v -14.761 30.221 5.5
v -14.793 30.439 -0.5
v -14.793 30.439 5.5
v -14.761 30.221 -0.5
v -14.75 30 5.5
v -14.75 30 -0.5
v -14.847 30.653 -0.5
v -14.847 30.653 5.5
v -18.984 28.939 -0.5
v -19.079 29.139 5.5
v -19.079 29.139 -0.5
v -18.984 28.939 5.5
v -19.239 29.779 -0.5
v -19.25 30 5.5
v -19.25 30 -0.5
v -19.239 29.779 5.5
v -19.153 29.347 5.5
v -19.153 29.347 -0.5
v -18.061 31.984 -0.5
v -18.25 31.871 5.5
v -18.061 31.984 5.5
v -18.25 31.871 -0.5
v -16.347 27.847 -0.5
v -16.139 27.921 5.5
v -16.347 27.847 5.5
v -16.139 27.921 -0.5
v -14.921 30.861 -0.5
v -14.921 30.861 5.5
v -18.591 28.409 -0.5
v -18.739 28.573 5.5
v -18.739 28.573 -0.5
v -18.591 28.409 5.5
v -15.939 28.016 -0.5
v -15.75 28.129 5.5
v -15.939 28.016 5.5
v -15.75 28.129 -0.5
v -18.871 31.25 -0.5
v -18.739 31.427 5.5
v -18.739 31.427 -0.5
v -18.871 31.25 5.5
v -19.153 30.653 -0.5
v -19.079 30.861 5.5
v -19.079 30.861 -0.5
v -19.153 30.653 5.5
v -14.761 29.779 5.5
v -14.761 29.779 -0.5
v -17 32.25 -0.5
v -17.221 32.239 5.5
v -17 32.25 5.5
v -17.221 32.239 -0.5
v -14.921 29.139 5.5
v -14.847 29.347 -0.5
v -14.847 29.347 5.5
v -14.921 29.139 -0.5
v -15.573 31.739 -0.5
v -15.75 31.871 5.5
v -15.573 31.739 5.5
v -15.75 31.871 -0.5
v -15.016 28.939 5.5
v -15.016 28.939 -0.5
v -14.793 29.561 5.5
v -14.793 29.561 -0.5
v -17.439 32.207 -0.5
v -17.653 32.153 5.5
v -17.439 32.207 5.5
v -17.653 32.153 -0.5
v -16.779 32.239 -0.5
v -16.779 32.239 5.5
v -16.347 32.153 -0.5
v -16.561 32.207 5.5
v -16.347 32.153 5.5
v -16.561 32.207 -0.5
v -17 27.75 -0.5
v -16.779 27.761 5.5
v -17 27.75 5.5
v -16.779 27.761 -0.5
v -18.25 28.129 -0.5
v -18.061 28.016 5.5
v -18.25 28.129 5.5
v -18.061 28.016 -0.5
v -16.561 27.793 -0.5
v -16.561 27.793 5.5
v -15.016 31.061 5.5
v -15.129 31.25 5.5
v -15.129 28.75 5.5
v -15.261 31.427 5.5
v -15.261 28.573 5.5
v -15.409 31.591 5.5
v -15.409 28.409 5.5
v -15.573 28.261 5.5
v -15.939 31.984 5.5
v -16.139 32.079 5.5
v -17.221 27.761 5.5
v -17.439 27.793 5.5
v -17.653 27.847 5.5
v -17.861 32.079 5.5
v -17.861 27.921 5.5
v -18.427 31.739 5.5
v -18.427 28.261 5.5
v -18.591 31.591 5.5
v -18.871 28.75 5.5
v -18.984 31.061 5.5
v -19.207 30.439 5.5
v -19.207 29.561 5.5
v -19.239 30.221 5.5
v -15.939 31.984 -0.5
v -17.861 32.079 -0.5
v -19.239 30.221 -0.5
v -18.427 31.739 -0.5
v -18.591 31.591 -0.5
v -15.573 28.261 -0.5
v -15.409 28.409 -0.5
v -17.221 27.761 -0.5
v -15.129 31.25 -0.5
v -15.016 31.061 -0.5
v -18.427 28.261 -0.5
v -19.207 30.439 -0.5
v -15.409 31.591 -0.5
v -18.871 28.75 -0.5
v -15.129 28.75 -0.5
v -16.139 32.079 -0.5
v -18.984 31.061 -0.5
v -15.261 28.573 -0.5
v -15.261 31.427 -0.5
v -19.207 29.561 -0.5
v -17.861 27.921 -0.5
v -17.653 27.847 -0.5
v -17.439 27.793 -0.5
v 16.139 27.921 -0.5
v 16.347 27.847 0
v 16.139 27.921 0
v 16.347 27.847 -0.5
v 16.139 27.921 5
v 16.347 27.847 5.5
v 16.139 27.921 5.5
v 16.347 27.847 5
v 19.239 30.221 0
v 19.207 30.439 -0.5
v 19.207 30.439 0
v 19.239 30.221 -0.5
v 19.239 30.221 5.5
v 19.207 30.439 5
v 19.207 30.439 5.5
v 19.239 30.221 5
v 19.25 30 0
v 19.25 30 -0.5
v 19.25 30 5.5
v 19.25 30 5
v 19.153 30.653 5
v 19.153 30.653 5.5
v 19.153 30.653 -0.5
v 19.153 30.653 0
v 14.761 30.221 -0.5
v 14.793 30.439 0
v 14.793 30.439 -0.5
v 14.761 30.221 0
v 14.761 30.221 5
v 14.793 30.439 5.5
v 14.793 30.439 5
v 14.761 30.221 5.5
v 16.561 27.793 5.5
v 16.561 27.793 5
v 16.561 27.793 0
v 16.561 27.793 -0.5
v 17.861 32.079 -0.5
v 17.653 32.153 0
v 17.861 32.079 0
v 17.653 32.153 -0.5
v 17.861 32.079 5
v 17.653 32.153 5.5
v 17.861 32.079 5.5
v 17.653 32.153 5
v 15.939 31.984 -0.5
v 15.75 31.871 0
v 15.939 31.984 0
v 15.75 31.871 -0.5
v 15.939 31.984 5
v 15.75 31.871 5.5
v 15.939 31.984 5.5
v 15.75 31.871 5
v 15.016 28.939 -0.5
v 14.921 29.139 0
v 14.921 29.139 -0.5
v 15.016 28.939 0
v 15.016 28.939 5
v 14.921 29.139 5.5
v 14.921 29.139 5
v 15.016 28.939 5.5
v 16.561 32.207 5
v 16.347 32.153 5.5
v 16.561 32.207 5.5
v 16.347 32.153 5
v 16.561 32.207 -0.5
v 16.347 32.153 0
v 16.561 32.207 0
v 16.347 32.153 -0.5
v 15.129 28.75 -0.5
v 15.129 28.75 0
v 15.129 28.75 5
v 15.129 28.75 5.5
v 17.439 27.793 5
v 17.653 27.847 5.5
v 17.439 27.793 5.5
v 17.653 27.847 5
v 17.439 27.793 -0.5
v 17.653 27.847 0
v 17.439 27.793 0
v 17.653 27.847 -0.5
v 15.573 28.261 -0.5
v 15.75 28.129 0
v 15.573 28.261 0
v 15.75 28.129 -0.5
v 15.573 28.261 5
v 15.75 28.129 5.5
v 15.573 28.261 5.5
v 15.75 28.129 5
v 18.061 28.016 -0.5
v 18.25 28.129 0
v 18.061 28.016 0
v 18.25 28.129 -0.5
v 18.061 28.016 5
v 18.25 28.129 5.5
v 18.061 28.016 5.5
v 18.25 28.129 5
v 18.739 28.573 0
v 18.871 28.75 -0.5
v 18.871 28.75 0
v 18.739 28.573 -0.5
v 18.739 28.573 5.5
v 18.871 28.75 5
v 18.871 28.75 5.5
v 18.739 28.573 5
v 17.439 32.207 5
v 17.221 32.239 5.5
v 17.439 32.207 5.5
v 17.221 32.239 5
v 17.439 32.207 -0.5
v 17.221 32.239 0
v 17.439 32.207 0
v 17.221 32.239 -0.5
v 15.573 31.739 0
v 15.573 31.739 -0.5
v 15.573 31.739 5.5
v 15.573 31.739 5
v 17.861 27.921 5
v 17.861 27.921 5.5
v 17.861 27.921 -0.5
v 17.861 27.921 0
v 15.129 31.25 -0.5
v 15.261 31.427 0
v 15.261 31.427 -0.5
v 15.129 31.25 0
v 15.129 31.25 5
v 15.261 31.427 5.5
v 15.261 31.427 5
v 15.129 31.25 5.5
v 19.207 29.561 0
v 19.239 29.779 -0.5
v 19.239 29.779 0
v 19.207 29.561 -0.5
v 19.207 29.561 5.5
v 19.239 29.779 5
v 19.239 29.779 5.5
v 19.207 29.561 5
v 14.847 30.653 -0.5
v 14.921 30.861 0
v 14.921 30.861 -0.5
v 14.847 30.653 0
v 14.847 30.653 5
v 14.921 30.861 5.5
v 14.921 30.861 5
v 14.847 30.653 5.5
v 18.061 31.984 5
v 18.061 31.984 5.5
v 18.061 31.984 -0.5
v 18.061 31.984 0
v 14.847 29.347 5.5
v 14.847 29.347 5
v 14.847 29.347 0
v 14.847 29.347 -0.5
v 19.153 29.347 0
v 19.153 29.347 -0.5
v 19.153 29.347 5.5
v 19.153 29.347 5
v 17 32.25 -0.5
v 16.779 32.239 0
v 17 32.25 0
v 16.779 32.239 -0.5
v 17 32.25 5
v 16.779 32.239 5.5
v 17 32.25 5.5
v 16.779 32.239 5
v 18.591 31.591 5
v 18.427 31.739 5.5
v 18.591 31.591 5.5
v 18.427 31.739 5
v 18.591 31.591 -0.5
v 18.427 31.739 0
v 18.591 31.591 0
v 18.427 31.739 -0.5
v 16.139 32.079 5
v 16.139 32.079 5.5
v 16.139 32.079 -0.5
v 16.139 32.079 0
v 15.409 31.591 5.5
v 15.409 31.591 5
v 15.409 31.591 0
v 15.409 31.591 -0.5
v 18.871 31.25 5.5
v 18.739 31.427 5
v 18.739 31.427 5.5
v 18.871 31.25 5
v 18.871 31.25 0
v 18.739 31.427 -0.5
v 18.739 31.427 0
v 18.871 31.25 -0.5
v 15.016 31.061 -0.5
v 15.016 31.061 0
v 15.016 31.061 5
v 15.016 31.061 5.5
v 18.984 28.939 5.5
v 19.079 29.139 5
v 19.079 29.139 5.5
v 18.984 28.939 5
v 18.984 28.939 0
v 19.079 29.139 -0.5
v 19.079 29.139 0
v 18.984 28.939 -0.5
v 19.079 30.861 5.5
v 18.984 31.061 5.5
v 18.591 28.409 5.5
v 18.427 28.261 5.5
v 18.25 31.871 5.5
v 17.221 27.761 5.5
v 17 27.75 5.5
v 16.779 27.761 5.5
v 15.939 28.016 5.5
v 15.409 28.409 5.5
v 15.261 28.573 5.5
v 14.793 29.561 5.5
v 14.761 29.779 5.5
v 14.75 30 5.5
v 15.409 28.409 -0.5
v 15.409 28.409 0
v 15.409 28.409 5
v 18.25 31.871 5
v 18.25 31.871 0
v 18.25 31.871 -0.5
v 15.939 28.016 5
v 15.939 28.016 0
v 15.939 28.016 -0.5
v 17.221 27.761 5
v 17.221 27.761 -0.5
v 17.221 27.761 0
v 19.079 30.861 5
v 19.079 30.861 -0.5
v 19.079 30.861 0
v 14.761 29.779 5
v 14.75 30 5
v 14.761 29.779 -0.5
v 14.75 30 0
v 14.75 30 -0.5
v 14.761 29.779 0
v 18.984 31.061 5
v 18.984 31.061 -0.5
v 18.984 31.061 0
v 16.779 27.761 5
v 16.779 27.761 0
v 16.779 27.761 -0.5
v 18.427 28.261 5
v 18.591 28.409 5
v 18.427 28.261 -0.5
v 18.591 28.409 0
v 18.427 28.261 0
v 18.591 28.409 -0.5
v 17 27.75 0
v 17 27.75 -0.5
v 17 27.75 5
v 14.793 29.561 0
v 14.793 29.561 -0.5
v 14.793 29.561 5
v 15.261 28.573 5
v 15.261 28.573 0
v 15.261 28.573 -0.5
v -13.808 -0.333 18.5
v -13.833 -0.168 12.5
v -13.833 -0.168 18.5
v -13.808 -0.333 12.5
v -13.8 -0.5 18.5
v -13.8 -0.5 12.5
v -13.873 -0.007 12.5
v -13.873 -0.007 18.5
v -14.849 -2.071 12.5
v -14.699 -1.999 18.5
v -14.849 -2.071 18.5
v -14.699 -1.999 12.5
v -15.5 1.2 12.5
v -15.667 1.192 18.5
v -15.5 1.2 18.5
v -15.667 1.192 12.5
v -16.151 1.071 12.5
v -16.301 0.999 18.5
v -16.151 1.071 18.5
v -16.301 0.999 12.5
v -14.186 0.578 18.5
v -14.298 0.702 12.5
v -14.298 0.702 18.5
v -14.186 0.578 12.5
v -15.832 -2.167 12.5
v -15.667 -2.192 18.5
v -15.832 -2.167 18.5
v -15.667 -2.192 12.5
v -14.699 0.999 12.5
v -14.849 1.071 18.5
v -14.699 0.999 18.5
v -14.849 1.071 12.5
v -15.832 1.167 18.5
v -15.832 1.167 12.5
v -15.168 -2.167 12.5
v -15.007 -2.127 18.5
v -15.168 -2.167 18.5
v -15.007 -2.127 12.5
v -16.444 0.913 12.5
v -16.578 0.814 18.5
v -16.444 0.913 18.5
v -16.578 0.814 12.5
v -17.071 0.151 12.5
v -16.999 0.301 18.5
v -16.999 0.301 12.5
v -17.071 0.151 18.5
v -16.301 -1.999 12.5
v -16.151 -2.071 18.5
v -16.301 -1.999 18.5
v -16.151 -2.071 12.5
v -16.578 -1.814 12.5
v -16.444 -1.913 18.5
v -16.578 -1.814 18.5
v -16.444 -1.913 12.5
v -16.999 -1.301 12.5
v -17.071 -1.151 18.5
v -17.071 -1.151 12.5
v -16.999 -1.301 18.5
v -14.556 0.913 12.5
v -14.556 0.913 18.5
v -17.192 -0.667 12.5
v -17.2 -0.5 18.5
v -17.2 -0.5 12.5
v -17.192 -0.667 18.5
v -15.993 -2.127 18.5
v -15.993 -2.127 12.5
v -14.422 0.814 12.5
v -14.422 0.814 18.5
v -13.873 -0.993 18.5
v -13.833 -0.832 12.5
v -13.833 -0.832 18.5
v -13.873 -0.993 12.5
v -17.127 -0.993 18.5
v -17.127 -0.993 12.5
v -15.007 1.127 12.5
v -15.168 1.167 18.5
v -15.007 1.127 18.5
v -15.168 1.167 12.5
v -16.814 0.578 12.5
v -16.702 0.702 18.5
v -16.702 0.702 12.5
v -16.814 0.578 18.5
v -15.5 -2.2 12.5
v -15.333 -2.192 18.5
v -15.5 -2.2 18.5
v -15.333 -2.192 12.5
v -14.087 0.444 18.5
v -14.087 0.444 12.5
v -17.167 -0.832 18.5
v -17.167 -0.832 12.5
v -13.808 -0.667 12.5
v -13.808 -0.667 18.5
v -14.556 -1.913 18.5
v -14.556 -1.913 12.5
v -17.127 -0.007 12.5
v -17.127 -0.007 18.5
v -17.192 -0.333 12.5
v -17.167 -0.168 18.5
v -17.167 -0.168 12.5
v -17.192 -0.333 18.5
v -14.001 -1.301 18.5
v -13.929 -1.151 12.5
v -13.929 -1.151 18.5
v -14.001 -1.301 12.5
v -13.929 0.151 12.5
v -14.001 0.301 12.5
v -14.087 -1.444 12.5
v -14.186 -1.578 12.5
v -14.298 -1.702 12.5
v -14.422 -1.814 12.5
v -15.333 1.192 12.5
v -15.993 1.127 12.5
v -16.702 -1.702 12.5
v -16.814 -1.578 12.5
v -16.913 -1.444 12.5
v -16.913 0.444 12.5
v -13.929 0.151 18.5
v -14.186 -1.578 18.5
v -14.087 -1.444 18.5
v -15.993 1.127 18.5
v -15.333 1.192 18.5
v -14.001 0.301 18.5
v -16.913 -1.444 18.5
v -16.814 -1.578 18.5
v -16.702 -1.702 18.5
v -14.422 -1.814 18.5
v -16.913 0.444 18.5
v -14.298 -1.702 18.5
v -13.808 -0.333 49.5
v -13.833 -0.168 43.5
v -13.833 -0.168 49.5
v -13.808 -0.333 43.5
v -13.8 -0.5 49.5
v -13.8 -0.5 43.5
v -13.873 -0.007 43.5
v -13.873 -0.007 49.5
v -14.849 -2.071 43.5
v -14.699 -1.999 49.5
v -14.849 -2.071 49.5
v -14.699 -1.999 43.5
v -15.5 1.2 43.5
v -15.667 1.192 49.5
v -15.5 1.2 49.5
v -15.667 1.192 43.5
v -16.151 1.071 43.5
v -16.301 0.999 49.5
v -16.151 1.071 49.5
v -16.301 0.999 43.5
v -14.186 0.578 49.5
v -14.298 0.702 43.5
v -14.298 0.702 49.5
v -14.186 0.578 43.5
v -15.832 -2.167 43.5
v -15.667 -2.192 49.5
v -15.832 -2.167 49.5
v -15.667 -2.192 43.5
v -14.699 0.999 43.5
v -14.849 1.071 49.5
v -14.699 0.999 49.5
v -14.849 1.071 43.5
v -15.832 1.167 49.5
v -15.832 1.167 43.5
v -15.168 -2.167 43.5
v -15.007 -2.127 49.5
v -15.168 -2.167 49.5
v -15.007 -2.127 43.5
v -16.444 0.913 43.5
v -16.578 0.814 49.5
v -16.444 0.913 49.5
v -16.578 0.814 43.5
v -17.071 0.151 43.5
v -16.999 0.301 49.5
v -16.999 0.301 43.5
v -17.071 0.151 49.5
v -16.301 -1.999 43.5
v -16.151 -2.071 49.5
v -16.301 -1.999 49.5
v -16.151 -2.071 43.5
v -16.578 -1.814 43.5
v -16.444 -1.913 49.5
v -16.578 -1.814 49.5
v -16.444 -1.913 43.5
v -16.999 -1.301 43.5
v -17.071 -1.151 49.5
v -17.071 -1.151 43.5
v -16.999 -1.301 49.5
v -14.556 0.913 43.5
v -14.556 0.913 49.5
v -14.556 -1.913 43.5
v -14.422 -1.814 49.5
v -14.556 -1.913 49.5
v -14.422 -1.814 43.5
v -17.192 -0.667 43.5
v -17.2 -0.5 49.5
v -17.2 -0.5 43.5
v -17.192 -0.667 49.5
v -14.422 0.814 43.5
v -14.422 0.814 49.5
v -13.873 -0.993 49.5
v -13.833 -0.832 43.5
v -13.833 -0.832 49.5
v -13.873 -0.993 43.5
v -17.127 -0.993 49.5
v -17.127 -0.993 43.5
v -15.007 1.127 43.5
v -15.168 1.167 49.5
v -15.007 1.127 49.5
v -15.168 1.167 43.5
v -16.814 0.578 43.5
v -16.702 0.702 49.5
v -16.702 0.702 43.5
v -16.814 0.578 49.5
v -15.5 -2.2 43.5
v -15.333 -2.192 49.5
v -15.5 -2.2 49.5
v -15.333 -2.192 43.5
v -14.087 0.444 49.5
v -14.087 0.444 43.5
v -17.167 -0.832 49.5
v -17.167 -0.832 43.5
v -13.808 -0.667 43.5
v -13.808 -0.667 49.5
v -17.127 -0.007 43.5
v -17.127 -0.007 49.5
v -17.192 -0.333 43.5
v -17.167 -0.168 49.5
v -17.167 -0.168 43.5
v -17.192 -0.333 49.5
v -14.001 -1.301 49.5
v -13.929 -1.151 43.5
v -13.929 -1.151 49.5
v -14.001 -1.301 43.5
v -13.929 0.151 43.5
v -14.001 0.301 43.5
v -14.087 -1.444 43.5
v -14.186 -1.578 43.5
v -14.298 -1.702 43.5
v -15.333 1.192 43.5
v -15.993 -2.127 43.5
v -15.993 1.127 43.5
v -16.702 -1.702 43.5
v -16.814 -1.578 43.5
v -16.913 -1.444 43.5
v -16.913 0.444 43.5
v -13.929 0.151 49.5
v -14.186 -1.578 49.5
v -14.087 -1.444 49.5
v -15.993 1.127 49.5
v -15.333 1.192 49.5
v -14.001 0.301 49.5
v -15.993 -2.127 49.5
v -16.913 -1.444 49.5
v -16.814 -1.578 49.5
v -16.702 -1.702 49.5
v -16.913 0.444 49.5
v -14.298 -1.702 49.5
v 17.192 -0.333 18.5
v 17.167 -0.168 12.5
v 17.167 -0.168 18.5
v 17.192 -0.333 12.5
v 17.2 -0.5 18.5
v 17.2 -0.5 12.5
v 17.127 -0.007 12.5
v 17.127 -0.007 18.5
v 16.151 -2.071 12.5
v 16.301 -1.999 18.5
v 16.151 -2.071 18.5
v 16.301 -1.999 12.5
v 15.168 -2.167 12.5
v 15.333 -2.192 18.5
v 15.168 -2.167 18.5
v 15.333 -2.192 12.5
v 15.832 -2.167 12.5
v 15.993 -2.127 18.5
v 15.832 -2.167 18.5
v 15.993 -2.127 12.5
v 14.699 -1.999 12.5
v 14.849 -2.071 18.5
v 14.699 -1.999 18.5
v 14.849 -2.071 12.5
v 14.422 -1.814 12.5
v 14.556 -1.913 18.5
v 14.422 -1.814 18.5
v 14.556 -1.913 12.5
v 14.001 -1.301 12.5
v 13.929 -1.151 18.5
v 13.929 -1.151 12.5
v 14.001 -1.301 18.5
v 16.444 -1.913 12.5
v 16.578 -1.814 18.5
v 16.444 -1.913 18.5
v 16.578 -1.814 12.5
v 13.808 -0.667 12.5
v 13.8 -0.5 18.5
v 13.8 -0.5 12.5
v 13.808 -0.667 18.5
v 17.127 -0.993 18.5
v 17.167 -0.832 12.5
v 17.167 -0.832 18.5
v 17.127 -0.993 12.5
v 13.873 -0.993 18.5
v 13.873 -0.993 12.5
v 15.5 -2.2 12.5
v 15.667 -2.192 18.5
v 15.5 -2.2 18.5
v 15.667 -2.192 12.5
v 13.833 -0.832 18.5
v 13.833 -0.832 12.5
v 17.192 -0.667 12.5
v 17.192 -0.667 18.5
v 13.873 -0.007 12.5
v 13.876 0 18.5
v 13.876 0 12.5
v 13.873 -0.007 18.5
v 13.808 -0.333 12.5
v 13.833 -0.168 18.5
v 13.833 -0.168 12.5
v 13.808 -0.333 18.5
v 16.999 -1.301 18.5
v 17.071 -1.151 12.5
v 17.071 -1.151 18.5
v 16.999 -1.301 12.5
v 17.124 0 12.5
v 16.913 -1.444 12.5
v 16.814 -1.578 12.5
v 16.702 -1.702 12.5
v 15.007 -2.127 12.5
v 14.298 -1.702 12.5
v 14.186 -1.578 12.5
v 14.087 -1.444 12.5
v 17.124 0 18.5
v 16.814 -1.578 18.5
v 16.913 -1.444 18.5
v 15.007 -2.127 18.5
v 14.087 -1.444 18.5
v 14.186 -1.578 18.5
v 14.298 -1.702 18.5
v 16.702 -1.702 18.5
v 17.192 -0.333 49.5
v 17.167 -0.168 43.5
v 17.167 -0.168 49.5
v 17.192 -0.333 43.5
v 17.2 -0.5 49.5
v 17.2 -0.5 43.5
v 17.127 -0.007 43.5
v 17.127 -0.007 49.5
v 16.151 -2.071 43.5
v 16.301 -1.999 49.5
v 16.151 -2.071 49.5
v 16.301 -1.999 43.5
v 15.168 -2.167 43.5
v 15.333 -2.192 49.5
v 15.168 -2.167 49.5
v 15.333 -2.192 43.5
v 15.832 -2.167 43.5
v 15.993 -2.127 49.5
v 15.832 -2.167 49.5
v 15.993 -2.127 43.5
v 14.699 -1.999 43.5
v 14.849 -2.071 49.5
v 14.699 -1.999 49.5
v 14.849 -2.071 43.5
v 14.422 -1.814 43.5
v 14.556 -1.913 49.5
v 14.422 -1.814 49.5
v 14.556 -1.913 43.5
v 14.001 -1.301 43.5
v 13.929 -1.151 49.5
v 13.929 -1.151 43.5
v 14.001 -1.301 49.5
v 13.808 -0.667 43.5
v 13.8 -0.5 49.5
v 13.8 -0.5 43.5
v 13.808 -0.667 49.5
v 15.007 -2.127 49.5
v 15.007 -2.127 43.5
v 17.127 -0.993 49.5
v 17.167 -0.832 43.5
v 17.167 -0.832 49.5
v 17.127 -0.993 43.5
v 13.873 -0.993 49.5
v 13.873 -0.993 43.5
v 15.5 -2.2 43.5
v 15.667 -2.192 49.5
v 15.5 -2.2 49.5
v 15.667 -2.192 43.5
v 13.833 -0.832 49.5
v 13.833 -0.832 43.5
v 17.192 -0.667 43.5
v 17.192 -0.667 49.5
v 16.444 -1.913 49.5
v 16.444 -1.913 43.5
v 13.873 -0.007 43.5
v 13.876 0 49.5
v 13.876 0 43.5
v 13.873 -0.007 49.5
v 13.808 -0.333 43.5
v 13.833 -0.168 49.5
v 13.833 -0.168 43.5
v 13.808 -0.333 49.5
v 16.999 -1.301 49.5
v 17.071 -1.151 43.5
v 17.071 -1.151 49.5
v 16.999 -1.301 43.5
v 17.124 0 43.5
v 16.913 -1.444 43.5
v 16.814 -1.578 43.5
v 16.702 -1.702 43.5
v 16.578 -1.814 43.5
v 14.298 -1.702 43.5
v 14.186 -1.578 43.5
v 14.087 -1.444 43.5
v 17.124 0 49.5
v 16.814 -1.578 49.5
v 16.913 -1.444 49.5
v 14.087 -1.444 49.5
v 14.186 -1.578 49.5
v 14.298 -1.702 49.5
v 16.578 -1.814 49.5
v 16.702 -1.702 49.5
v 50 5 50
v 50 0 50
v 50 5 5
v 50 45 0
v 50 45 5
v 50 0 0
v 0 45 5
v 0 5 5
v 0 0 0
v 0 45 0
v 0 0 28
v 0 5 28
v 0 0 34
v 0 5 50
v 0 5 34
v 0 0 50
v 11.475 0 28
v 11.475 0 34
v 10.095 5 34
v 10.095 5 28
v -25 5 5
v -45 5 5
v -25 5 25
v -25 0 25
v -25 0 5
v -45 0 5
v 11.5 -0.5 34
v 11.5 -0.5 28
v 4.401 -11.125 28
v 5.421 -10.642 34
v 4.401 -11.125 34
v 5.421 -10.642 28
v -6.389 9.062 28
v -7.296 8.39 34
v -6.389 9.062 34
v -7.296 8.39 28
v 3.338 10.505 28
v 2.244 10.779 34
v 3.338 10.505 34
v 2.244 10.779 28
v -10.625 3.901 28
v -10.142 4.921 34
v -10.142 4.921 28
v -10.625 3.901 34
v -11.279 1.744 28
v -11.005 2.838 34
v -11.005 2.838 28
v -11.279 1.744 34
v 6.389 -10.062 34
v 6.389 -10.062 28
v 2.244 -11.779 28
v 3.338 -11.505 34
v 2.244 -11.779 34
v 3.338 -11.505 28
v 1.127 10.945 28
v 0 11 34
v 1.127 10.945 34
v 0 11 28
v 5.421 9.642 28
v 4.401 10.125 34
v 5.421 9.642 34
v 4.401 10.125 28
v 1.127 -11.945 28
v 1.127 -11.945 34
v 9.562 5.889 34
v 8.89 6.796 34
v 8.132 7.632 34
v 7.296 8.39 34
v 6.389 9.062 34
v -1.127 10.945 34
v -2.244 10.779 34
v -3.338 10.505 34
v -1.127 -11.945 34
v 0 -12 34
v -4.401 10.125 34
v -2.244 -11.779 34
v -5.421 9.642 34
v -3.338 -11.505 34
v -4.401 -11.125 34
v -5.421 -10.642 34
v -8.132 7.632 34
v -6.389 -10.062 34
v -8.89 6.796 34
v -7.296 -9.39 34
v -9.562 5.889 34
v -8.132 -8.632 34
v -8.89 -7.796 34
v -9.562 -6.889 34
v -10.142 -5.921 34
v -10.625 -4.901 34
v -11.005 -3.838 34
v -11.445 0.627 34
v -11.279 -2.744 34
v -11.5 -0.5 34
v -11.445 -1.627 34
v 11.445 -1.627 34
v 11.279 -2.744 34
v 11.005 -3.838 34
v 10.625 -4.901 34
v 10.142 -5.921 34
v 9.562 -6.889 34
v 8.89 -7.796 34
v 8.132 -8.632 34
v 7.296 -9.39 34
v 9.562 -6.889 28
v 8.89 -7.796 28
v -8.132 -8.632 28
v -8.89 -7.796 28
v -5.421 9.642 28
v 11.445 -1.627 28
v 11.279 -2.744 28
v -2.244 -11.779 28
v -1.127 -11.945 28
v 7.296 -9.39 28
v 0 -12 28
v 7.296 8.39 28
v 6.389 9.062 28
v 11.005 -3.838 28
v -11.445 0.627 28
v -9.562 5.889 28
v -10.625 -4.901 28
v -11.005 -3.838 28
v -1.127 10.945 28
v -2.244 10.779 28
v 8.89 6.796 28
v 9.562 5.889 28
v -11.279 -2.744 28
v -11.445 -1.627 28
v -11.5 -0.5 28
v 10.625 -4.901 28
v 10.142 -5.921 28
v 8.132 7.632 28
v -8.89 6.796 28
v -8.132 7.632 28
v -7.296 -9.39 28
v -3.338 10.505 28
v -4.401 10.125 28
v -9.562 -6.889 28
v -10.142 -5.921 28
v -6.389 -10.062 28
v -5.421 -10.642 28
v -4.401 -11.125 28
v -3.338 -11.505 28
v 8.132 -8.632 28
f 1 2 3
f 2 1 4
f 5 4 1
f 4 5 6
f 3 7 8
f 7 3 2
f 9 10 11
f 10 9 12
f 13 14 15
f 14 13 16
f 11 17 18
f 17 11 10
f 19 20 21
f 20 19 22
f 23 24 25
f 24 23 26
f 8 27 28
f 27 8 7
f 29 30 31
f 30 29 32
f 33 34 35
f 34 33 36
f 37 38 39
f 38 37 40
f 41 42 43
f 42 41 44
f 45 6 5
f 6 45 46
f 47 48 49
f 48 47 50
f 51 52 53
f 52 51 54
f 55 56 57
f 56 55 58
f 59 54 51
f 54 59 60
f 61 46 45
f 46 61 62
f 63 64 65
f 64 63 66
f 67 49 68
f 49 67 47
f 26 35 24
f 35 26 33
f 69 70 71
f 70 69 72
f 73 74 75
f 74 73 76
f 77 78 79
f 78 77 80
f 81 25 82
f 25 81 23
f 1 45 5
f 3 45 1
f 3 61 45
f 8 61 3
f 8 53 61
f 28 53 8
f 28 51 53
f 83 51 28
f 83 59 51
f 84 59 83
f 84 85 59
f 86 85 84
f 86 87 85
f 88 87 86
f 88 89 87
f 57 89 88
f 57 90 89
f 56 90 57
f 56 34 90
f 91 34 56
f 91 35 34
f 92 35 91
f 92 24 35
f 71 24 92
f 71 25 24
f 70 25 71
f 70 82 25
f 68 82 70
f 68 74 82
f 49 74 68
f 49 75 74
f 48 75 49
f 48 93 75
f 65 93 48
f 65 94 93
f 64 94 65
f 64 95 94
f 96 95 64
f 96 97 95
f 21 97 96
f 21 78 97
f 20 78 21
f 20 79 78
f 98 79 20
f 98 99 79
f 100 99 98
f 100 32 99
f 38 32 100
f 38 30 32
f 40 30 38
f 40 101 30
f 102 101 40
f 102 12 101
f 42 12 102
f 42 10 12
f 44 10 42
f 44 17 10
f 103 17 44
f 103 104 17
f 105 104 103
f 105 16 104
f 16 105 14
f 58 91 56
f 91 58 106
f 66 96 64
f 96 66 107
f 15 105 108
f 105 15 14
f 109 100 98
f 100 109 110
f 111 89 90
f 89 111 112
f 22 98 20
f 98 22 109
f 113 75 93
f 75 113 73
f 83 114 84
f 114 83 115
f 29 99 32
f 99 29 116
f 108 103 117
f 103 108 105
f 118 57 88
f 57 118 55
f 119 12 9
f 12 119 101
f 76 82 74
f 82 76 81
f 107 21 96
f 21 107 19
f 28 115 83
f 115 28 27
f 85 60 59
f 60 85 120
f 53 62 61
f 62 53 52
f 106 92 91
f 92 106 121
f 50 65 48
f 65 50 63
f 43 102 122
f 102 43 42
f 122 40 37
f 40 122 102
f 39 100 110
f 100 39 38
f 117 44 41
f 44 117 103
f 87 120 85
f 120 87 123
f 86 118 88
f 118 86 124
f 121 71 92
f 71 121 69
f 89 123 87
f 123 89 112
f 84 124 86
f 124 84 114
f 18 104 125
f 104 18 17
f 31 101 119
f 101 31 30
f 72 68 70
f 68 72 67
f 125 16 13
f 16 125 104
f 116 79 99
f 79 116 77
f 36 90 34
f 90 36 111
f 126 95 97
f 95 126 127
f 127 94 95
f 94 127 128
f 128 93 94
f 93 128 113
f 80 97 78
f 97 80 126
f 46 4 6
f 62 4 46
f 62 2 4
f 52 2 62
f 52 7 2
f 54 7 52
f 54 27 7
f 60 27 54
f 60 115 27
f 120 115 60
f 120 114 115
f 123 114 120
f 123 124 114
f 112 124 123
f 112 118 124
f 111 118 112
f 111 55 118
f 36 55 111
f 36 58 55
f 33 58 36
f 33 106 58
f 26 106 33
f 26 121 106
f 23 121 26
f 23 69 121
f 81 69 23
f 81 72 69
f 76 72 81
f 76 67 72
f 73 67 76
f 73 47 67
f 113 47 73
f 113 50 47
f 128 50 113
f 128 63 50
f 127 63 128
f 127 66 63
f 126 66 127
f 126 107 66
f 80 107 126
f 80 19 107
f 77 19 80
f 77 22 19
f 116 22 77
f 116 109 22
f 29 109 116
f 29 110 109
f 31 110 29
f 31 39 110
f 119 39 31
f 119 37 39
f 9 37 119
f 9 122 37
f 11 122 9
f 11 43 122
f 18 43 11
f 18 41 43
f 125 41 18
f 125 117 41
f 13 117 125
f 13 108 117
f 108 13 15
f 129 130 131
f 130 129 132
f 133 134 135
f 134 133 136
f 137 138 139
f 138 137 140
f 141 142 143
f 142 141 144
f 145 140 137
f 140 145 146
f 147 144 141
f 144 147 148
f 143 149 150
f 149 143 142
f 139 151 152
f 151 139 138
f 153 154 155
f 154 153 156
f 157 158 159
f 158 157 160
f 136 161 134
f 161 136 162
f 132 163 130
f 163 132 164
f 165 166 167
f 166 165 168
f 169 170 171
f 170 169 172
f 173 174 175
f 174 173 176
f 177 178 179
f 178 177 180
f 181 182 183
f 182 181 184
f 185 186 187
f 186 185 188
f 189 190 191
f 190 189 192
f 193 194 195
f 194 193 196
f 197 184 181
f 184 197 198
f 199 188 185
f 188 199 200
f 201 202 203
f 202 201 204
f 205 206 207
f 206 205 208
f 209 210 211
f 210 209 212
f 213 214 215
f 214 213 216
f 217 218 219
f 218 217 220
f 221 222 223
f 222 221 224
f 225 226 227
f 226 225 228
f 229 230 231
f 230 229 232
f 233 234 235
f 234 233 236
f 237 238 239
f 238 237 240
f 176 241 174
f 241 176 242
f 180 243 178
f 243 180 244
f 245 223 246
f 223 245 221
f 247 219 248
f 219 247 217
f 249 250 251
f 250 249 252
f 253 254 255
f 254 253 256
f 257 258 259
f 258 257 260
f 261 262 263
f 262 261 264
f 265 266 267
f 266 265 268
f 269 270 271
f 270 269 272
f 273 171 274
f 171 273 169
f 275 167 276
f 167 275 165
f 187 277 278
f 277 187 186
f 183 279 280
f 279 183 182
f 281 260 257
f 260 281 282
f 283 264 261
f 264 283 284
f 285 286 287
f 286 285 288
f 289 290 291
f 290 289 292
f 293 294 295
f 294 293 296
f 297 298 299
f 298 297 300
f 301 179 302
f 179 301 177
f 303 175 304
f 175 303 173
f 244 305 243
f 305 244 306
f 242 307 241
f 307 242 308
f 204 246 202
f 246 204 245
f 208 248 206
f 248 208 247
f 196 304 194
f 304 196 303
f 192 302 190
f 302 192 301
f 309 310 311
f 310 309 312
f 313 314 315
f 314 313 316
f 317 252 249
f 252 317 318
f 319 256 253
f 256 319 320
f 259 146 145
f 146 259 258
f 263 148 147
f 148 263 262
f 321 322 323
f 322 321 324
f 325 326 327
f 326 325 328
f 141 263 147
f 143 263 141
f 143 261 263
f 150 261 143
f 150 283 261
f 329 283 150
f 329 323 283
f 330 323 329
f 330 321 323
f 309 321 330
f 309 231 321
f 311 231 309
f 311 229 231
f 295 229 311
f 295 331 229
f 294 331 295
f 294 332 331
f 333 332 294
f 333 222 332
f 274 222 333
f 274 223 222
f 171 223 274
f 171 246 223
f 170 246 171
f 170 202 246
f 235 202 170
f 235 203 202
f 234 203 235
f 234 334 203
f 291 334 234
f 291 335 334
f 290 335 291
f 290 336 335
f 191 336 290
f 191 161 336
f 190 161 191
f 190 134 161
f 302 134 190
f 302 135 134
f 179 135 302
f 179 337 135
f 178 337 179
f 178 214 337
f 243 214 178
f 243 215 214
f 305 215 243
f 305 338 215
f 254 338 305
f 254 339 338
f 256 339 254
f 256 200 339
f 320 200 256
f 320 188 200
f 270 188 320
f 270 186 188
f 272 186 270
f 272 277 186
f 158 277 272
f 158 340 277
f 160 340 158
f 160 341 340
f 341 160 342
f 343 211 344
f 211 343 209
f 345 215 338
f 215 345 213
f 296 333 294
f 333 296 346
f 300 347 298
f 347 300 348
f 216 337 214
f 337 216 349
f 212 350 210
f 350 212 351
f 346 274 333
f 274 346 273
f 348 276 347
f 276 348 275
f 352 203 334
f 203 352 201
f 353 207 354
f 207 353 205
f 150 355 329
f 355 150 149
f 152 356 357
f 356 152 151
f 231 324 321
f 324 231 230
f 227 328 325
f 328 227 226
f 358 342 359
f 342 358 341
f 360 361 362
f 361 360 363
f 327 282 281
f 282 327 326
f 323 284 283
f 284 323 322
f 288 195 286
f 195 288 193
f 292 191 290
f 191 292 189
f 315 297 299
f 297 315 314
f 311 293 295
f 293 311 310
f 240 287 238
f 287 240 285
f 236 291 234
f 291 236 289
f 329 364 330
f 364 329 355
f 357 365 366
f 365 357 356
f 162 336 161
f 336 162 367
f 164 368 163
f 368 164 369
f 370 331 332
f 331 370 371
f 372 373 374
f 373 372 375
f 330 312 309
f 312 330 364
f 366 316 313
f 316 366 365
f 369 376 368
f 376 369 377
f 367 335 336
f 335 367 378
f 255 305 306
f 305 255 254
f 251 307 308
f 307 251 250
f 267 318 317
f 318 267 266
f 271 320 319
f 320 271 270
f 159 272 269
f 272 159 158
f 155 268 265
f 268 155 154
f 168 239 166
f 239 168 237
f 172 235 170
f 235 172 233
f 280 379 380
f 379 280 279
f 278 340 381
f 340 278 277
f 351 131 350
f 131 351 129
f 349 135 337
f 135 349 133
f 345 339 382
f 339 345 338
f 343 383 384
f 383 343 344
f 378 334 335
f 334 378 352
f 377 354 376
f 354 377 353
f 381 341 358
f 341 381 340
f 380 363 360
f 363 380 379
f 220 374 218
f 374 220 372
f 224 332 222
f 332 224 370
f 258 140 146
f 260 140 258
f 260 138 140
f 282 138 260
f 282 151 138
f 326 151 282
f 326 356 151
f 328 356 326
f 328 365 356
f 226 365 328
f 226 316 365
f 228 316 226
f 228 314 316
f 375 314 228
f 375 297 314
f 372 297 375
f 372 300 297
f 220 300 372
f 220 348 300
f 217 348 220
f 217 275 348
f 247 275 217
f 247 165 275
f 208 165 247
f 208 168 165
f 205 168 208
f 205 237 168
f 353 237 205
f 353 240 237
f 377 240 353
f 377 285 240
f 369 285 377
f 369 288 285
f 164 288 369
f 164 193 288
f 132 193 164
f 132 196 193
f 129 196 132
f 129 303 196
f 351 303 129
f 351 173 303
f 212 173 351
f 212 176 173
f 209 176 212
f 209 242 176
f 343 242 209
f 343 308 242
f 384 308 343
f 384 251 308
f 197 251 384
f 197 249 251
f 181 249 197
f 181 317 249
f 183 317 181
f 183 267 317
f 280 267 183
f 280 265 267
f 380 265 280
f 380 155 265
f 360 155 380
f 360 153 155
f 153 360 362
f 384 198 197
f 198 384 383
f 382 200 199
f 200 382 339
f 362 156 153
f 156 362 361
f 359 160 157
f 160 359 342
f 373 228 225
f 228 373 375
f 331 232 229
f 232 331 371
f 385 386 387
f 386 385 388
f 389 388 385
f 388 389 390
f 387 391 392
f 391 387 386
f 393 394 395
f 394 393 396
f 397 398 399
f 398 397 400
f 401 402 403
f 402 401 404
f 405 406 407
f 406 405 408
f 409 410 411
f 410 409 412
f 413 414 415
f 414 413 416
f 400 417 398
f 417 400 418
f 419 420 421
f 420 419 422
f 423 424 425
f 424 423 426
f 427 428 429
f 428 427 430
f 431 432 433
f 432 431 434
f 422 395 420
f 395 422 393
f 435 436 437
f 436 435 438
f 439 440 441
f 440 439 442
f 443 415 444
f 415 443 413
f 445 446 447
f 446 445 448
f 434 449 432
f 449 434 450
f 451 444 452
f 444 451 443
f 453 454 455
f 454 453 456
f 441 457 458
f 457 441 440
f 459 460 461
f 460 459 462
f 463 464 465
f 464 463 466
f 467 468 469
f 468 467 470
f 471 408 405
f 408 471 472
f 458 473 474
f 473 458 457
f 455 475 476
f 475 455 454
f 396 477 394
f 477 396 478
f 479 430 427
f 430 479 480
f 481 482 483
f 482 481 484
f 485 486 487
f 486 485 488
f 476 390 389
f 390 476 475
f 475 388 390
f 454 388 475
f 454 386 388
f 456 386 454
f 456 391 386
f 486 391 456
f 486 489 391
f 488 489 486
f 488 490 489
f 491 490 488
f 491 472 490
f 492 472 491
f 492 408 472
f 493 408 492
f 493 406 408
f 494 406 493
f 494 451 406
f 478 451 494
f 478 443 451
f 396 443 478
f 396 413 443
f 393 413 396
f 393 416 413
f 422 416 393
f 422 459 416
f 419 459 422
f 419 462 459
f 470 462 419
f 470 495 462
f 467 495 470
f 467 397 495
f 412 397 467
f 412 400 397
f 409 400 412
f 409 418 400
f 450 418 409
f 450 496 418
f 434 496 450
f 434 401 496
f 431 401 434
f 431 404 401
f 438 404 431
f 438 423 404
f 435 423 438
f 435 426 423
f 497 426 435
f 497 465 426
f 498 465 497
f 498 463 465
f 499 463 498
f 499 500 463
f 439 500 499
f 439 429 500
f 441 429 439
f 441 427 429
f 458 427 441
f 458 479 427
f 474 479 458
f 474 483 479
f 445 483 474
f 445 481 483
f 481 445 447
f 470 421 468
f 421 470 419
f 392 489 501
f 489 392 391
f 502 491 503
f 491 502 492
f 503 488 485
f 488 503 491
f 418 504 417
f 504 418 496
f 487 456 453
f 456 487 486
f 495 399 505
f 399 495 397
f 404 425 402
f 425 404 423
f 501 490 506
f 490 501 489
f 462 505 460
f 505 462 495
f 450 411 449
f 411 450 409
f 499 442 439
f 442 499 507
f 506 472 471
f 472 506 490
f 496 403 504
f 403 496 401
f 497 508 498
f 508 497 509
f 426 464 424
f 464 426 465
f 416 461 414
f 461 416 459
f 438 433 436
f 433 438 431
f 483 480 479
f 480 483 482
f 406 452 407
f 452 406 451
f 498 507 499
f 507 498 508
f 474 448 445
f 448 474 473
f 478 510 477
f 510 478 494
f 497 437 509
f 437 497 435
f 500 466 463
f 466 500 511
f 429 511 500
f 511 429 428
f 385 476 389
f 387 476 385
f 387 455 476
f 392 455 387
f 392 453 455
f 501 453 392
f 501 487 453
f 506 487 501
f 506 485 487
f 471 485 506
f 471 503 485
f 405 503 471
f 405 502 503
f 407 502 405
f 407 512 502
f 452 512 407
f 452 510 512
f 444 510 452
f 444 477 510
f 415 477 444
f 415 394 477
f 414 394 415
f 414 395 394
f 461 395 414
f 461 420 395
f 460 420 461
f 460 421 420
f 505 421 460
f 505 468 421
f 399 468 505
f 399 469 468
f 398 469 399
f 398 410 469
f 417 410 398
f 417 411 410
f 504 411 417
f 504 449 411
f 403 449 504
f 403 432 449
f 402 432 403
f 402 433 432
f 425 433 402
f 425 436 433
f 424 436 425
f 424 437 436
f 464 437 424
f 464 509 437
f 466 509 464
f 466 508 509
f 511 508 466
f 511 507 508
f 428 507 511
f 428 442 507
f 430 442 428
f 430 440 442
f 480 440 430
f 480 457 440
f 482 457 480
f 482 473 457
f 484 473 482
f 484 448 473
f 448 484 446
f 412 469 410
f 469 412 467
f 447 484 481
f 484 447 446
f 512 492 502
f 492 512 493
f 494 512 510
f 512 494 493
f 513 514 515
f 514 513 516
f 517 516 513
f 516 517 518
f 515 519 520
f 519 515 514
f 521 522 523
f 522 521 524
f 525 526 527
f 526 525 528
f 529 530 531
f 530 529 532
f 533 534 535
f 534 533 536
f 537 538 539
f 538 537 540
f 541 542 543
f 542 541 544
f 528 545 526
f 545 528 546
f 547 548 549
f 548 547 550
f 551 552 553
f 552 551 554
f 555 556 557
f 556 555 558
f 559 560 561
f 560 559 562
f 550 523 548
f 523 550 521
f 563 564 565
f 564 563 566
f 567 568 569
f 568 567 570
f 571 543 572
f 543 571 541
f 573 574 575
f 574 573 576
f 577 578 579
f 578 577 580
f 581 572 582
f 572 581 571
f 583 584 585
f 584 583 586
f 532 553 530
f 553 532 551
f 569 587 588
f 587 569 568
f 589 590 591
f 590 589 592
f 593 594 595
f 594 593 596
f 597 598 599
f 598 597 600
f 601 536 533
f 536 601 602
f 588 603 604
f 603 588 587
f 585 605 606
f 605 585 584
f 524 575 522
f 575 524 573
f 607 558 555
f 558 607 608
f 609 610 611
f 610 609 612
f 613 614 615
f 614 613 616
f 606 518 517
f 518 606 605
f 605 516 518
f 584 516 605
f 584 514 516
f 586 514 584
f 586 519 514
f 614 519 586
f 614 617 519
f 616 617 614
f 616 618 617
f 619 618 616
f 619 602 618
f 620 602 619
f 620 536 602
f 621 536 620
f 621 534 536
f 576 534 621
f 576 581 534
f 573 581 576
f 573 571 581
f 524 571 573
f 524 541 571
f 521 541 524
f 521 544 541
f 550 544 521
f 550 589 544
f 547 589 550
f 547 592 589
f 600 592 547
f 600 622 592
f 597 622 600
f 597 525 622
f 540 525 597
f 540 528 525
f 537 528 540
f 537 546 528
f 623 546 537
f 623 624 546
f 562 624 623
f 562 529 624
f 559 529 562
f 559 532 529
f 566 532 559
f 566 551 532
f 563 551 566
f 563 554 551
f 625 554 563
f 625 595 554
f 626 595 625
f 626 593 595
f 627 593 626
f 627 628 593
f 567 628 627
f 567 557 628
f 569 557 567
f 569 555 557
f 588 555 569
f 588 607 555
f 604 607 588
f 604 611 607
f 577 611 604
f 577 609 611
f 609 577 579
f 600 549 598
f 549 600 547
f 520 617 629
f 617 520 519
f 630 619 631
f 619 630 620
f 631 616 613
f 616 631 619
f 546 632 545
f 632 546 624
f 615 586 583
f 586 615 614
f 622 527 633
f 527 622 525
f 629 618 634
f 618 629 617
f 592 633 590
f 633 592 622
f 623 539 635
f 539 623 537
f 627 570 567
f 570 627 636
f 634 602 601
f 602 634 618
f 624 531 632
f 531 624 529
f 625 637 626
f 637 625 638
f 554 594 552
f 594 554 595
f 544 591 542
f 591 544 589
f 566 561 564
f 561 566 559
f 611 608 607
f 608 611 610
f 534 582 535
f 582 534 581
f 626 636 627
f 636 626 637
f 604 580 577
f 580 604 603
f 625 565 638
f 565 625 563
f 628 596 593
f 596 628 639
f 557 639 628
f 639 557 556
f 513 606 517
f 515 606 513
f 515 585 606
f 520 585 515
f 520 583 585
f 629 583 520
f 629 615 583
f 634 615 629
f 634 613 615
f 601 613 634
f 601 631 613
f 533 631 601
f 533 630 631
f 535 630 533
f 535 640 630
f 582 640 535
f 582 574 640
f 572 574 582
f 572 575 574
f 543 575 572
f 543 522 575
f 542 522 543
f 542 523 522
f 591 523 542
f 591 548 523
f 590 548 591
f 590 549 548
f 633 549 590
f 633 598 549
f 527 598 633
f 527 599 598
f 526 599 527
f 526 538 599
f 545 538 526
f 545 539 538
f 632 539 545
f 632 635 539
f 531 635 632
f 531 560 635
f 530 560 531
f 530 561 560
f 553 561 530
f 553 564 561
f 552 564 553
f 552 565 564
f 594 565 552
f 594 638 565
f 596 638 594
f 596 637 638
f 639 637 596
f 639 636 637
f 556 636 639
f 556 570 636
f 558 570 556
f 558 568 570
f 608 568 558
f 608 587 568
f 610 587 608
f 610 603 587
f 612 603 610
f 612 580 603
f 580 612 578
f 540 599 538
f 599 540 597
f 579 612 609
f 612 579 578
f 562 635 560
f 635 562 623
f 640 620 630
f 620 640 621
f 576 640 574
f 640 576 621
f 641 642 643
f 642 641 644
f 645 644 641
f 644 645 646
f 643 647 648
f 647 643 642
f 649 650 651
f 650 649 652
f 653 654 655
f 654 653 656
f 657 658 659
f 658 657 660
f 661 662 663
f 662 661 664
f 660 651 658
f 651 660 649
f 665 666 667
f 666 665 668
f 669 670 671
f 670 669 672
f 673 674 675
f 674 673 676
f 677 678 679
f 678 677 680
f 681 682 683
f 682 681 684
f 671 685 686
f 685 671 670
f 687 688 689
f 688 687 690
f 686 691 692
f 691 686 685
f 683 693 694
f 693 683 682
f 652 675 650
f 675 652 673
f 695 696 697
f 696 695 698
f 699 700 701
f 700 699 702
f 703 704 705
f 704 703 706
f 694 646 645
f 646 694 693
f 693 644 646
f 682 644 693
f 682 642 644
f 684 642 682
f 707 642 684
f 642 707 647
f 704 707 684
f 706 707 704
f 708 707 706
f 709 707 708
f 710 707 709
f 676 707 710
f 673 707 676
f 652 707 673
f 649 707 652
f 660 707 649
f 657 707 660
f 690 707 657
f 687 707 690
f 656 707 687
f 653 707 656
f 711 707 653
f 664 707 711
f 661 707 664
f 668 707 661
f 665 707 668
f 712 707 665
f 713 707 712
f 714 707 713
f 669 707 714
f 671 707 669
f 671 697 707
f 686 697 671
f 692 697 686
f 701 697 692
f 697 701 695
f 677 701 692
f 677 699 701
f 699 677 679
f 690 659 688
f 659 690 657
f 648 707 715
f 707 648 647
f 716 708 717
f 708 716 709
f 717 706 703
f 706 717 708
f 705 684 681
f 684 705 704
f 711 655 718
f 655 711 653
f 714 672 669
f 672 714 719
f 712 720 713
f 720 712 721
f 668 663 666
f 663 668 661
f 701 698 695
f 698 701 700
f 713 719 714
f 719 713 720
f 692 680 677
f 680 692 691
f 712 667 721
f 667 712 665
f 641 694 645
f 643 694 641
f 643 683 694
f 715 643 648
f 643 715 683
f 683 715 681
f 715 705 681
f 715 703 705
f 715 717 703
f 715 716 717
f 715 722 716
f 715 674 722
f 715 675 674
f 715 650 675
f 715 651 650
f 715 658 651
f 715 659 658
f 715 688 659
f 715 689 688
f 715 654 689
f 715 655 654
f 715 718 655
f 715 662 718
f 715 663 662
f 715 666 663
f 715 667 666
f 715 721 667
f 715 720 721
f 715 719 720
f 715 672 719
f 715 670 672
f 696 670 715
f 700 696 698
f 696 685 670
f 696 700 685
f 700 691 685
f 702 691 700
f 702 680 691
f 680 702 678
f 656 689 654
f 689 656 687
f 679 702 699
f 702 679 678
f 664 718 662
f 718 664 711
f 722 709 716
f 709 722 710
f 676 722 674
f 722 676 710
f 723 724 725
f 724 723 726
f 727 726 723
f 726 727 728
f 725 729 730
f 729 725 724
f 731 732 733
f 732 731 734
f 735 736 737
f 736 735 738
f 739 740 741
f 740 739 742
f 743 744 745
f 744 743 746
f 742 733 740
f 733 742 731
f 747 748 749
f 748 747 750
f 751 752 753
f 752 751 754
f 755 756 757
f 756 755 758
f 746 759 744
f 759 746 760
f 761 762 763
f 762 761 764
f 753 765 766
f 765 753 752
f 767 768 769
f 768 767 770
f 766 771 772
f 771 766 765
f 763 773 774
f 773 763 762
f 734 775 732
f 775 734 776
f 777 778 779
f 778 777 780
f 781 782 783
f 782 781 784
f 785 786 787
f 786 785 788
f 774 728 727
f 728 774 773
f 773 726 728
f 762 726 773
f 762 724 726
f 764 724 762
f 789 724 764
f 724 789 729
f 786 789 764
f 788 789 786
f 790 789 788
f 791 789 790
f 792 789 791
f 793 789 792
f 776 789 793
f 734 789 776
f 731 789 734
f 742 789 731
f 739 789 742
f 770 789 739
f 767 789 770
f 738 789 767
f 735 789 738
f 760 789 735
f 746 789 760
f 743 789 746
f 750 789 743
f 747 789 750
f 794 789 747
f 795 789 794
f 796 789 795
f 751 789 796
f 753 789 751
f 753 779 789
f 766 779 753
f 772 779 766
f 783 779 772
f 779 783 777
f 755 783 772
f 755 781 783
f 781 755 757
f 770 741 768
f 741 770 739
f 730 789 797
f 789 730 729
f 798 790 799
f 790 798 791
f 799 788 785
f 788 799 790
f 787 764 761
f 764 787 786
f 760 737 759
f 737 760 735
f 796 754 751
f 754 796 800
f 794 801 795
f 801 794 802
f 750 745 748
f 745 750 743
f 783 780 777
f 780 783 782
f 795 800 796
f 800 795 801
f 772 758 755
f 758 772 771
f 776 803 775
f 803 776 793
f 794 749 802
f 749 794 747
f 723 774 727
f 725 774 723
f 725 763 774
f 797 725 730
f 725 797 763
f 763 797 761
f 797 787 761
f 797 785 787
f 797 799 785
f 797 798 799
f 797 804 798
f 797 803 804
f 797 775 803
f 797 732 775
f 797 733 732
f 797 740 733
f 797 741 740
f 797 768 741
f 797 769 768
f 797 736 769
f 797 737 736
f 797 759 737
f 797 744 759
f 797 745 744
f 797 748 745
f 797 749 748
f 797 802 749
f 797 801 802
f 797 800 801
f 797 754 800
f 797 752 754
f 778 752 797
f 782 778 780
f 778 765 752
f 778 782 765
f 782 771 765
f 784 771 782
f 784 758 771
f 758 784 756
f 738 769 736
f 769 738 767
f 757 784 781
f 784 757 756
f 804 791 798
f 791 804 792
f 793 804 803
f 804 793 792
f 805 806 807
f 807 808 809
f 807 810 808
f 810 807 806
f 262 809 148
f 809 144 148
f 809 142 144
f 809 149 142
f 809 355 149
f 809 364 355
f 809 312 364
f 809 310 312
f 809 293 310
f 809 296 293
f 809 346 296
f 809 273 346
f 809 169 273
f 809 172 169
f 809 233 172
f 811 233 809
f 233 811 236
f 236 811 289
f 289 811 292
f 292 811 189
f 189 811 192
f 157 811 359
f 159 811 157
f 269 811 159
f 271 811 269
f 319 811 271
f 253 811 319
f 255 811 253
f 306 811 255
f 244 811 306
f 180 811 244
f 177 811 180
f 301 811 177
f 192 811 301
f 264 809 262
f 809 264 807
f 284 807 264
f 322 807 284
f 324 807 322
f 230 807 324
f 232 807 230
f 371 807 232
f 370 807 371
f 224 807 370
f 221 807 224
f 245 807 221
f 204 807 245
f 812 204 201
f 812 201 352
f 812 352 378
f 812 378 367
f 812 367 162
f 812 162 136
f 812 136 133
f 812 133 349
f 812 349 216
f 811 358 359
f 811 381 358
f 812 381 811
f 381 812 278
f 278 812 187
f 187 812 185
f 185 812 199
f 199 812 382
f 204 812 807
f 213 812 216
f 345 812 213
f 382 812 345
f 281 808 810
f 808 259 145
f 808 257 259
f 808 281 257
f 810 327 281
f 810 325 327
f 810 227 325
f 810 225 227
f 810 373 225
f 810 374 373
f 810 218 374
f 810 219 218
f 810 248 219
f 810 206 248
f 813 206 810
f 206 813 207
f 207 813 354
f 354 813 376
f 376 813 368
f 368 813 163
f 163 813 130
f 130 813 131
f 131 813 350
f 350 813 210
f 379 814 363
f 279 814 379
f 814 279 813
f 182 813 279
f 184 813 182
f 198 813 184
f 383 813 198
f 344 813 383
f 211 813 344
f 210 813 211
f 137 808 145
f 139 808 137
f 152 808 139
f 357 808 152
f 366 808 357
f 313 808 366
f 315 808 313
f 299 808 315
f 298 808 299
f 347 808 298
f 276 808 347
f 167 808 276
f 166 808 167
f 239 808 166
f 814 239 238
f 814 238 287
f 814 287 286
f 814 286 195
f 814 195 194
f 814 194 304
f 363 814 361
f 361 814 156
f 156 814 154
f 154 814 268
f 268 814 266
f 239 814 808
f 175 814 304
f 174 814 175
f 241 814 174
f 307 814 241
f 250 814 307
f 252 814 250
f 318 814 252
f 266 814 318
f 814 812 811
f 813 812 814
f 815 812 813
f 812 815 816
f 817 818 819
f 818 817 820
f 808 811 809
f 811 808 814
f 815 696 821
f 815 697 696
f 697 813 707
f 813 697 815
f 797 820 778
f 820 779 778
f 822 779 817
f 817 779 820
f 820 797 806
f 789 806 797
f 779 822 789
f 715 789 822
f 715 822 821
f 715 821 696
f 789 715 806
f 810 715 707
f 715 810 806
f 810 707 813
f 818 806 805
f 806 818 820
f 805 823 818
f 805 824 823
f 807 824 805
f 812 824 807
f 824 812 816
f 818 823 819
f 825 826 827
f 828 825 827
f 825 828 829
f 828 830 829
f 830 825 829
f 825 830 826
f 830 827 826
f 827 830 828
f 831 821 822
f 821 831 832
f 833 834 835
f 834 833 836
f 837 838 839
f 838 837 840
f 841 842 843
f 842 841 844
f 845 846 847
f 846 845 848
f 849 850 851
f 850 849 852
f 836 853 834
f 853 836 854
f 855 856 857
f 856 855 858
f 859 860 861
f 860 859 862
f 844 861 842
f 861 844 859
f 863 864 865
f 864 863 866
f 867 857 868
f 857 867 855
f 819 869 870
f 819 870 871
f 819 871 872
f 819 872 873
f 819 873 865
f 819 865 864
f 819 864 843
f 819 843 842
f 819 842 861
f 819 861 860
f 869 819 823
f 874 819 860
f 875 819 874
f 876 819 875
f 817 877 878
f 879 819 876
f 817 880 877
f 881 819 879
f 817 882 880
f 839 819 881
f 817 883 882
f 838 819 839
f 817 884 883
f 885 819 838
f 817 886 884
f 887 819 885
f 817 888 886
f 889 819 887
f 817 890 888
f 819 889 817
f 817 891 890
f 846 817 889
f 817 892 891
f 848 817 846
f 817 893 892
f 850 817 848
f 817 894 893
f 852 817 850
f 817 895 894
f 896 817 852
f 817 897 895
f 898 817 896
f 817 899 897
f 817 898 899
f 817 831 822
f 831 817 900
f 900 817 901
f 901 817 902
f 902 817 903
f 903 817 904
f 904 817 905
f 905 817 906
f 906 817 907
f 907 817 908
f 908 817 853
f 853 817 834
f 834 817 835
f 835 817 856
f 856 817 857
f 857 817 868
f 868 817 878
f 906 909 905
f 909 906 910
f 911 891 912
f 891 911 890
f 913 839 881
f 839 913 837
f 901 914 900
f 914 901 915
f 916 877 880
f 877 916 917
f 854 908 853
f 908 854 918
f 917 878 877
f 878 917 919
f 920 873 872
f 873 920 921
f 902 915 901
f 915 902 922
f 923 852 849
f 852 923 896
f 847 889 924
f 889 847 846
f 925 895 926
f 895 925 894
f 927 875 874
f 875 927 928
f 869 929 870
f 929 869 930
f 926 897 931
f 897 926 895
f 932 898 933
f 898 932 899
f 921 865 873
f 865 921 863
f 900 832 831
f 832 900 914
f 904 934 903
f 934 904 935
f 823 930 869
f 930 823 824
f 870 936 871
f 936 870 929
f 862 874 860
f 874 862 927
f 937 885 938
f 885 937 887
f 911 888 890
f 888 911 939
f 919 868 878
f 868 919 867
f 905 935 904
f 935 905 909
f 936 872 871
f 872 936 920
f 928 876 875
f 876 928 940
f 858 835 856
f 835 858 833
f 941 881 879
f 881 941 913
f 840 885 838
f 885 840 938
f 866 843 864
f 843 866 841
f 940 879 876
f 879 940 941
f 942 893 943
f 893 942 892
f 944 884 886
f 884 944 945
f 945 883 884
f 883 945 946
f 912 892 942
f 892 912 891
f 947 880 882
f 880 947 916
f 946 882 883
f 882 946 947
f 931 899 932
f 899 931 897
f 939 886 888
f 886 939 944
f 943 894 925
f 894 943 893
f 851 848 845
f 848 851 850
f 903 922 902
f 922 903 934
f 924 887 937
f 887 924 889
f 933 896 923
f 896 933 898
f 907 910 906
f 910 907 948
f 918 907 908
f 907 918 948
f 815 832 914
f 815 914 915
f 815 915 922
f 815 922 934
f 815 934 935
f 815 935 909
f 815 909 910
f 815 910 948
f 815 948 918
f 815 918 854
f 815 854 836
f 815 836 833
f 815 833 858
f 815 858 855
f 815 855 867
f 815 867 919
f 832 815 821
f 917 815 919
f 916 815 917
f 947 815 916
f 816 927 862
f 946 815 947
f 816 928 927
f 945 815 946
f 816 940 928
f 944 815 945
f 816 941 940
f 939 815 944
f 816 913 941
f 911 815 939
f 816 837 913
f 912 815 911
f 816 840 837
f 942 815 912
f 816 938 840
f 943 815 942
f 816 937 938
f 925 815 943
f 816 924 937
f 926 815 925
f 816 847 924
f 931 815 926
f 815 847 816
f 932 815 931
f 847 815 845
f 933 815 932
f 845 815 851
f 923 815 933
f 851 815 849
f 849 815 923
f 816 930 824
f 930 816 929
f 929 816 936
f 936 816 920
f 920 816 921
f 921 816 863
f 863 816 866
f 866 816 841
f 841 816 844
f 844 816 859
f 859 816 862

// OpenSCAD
// === NEMA 17 Stepper Motor Mounting Bracket ===
// Print orientation: base plate on bed (XY plane, z=0)

// --- Base plate dimensions ---
base_x_half = 25;       // Half-width in X (total 50 mm)
base_y = 45;            // Depth in Y (0 to 45 mm)
base_z = 5;             // Thickness in Z

// --- Base plate mounting holes (M4) ---
m4_dia = 4.5;           // M4 hole diameter
m4_x = 17;              // X offset of M4 holes
m4_y = 30;              // Y position of M4 holes

// --- Vertical motor plate dimensions ---
motor_plate_x_half = 25;  // Same width as base
motor_plate_y = 5;        // Thickness (along Y, extends from y=0 to y=5)
motor_plate_z = 50;       // Height

// --- Motor centring boss hole ---
boss_dia = 23;            // Boss hole diameter
boss_x = 0;               // Centre X
boss_z = 28;              // Centre Z

// --- M3 screw holes for motor (31 mm square pattern) ---
m3_dia = 3.4;             // M3 hole diameter
m3_pattern = 31;          // Square pattern size
m3_offset = m3_pattern / 2;  // Half-pattern offset

// --- Triangular gussets ---
gusset_thickness = 5;     // Thickness in X (along base width)
gusset_leg_y = 20;        // Leg along +Y
gusset_leg_z = 20;        // Leg along +Z
gusset_x_start = 20;      // Inner X edge of gusset (right side)

// --- Global fineness ---
$fn = 64;

// === Build the part ===
union() {
    // --- Base plate ---
    translate([0, 0, 0])
        cube([base_x_half * 2, base_y, base_z], center = false);

    // --- Vertical motor plate ---
    // Extends from y=0 to y=5, z=0 to z=50, x=-25 to 25
    translate([0, 0, 0])
        cube([motor_plate_x_half * 2, motor_plate_y, motor_plate_z], center = false);

    // --- Triangular gussets ---
    // Right gusset: right triangle in YZ plane, right angle at (y=5, z=5)
    // Legs: +Y from 5 to 25, +Z from 5 to 25
    // Positioned at x = 20 to 25
    translate([gusset_x_start, 5, 5])
        rotate([90, 0, 0])
            linear_extrude(height = gusset_thickness, center = false)
                polygon([[0, 0], [gusset_leg_y, 0], [0, gusset_leg_z]]);

    // Left gusset: mirrored across X=0
    // The right triangle should be mirrored, so we flip the polygon
    translate([-gusset_x_start - gusset_thickness, 5, 5])
        rotate([90, 0, 0])
            linear_extrude(height = gusset_thickness, center = false)
                polygon([[0, 0], [-gusset_leg_y, 0], [0, gusset_leg_z]]);

    // --- Cut: M4 through-holes in base plate ---
    // These go through the base plate (z=0 to z=5) and into the motor plate
    // Extend past both faces by 0.5 mm
    for (sign = [-1, 1]) {
        translate([sign * m4_x, m4_y, -0.5])
            cylinder(d = m4_dia, h = base_z + 1, center = false);
    }

    // --- Cut: Boss hole through motor plate (along Y) ---
    // Centre at (x=0, z=28), along Y from y=0 to y=5
    // Extend past Y faces by 0.5 mm
    translate([boss_x, -0.5, boss_z])
        cylinder(d = boss_dia, h = motor_plate_y + 1, center = false, rotate = [90, 0, 0]);

    // --- Cut: M3 screw holes for motor (4 holes on 31 mm square pattern) ---
    // Centred on boss hole at (x=0, z=28)
    for (sx = [-1, 1]) {
        for (sz = [-1, 1]) {
            translate([sx * m3_offset, -0.5, boss_z + sz * m3_offset])
                cylinder(d = m3_dia, h = motor_plate_y + 1, center = false, rotate = [90, 0, 0]);
        }
    }
}
